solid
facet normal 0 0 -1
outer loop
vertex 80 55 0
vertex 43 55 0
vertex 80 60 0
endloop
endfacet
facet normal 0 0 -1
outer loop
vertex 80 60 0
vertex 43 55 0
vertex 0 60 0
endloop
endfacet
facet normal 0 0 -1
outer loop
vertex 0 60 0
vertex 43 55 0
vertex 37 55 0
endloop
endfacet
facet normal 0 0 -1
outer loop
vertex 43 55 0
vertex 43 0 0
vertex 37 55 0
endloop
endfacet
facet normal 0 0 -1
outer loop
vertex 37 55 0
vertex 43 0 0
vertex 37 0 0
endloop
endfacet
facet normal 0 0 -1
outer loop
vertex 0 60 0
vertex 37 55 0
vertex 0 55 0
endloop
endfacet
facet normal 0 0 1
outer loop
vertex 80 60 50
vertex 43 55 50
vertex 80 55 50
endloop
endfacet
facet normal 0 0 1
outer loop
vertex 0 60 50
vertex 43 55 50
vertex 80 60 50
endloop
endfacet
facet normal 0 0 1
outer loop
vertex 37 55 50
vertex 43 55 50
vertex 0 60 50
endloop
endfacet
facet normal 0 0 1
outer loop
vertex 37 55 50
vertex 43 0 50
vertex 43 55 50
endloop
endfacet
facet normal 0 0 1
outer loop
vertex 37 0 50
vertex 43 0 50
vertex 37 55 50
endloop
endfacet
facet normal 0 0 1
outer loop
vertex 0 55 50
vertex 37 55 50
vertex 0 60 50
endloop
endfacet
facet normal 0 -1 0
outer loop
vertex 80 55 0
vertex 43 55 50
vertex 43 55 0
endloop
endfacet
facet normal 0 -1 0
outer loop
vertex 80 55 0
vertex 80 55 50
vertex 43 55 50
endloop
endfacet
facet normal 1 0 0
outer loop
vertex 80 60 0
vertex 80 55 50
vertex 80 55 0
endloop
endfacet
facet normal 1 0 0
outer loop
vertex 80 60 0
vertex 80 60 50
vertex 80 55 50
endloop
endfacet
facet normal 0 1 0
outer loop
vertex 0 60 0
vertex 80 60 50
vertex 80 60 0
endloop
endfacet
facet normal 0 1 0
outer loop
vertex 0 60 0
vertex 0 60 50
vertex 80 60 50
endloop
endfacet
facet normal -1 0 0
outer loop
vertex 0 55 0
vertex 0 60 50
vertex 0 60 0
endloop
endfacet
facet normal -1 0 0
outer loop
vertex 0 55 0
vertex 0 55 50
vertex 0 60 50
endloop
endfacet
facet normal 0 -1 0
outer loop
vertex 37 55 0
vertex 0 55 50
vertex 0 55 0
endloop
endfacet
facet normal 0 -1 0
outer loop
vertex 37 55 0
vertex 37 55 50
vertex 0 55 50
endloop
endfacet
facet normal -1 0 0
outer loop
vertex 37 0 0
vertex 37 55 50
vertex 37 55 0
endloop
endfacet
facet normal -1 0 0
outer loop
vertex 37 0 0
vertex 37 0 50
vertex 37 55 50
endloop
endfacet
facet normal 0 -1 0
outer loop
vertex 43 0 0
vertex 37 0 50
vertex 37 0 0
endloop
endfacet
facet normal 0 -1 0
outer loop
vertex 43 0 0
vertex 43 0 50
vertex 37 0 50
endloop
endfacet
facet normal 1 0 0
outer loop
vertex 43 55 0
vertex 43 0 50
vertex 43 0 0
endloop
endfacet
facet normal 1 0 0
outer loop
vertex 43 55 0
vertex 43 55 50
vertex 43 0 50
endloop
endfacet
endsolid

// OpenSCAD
$fn = 32;

// ----------------------------------------------------------------------
// Structural section: tee 80 x 60 mm
// ----------------------------------------------------------------------

// --- parameters (mm) ---
sec_w = 80;               // tee width, X
sec_h = 60;               // tee height, Y
flange_t = 5;             // top flange thickness
web_t = 6;                // web thickness
plate_t = 50;             // cut length, Z (extrusion height)

profile = [[37, 0], [43, 0], [43, 55], [80, 55], [80, 60], [0, 60], [0, 55], [37, 55]];  // primary outline, 8 points, counter clockwise

// --- the one profile operation ---
linear_extrude(height = plate_t) polygon(points = profile);
